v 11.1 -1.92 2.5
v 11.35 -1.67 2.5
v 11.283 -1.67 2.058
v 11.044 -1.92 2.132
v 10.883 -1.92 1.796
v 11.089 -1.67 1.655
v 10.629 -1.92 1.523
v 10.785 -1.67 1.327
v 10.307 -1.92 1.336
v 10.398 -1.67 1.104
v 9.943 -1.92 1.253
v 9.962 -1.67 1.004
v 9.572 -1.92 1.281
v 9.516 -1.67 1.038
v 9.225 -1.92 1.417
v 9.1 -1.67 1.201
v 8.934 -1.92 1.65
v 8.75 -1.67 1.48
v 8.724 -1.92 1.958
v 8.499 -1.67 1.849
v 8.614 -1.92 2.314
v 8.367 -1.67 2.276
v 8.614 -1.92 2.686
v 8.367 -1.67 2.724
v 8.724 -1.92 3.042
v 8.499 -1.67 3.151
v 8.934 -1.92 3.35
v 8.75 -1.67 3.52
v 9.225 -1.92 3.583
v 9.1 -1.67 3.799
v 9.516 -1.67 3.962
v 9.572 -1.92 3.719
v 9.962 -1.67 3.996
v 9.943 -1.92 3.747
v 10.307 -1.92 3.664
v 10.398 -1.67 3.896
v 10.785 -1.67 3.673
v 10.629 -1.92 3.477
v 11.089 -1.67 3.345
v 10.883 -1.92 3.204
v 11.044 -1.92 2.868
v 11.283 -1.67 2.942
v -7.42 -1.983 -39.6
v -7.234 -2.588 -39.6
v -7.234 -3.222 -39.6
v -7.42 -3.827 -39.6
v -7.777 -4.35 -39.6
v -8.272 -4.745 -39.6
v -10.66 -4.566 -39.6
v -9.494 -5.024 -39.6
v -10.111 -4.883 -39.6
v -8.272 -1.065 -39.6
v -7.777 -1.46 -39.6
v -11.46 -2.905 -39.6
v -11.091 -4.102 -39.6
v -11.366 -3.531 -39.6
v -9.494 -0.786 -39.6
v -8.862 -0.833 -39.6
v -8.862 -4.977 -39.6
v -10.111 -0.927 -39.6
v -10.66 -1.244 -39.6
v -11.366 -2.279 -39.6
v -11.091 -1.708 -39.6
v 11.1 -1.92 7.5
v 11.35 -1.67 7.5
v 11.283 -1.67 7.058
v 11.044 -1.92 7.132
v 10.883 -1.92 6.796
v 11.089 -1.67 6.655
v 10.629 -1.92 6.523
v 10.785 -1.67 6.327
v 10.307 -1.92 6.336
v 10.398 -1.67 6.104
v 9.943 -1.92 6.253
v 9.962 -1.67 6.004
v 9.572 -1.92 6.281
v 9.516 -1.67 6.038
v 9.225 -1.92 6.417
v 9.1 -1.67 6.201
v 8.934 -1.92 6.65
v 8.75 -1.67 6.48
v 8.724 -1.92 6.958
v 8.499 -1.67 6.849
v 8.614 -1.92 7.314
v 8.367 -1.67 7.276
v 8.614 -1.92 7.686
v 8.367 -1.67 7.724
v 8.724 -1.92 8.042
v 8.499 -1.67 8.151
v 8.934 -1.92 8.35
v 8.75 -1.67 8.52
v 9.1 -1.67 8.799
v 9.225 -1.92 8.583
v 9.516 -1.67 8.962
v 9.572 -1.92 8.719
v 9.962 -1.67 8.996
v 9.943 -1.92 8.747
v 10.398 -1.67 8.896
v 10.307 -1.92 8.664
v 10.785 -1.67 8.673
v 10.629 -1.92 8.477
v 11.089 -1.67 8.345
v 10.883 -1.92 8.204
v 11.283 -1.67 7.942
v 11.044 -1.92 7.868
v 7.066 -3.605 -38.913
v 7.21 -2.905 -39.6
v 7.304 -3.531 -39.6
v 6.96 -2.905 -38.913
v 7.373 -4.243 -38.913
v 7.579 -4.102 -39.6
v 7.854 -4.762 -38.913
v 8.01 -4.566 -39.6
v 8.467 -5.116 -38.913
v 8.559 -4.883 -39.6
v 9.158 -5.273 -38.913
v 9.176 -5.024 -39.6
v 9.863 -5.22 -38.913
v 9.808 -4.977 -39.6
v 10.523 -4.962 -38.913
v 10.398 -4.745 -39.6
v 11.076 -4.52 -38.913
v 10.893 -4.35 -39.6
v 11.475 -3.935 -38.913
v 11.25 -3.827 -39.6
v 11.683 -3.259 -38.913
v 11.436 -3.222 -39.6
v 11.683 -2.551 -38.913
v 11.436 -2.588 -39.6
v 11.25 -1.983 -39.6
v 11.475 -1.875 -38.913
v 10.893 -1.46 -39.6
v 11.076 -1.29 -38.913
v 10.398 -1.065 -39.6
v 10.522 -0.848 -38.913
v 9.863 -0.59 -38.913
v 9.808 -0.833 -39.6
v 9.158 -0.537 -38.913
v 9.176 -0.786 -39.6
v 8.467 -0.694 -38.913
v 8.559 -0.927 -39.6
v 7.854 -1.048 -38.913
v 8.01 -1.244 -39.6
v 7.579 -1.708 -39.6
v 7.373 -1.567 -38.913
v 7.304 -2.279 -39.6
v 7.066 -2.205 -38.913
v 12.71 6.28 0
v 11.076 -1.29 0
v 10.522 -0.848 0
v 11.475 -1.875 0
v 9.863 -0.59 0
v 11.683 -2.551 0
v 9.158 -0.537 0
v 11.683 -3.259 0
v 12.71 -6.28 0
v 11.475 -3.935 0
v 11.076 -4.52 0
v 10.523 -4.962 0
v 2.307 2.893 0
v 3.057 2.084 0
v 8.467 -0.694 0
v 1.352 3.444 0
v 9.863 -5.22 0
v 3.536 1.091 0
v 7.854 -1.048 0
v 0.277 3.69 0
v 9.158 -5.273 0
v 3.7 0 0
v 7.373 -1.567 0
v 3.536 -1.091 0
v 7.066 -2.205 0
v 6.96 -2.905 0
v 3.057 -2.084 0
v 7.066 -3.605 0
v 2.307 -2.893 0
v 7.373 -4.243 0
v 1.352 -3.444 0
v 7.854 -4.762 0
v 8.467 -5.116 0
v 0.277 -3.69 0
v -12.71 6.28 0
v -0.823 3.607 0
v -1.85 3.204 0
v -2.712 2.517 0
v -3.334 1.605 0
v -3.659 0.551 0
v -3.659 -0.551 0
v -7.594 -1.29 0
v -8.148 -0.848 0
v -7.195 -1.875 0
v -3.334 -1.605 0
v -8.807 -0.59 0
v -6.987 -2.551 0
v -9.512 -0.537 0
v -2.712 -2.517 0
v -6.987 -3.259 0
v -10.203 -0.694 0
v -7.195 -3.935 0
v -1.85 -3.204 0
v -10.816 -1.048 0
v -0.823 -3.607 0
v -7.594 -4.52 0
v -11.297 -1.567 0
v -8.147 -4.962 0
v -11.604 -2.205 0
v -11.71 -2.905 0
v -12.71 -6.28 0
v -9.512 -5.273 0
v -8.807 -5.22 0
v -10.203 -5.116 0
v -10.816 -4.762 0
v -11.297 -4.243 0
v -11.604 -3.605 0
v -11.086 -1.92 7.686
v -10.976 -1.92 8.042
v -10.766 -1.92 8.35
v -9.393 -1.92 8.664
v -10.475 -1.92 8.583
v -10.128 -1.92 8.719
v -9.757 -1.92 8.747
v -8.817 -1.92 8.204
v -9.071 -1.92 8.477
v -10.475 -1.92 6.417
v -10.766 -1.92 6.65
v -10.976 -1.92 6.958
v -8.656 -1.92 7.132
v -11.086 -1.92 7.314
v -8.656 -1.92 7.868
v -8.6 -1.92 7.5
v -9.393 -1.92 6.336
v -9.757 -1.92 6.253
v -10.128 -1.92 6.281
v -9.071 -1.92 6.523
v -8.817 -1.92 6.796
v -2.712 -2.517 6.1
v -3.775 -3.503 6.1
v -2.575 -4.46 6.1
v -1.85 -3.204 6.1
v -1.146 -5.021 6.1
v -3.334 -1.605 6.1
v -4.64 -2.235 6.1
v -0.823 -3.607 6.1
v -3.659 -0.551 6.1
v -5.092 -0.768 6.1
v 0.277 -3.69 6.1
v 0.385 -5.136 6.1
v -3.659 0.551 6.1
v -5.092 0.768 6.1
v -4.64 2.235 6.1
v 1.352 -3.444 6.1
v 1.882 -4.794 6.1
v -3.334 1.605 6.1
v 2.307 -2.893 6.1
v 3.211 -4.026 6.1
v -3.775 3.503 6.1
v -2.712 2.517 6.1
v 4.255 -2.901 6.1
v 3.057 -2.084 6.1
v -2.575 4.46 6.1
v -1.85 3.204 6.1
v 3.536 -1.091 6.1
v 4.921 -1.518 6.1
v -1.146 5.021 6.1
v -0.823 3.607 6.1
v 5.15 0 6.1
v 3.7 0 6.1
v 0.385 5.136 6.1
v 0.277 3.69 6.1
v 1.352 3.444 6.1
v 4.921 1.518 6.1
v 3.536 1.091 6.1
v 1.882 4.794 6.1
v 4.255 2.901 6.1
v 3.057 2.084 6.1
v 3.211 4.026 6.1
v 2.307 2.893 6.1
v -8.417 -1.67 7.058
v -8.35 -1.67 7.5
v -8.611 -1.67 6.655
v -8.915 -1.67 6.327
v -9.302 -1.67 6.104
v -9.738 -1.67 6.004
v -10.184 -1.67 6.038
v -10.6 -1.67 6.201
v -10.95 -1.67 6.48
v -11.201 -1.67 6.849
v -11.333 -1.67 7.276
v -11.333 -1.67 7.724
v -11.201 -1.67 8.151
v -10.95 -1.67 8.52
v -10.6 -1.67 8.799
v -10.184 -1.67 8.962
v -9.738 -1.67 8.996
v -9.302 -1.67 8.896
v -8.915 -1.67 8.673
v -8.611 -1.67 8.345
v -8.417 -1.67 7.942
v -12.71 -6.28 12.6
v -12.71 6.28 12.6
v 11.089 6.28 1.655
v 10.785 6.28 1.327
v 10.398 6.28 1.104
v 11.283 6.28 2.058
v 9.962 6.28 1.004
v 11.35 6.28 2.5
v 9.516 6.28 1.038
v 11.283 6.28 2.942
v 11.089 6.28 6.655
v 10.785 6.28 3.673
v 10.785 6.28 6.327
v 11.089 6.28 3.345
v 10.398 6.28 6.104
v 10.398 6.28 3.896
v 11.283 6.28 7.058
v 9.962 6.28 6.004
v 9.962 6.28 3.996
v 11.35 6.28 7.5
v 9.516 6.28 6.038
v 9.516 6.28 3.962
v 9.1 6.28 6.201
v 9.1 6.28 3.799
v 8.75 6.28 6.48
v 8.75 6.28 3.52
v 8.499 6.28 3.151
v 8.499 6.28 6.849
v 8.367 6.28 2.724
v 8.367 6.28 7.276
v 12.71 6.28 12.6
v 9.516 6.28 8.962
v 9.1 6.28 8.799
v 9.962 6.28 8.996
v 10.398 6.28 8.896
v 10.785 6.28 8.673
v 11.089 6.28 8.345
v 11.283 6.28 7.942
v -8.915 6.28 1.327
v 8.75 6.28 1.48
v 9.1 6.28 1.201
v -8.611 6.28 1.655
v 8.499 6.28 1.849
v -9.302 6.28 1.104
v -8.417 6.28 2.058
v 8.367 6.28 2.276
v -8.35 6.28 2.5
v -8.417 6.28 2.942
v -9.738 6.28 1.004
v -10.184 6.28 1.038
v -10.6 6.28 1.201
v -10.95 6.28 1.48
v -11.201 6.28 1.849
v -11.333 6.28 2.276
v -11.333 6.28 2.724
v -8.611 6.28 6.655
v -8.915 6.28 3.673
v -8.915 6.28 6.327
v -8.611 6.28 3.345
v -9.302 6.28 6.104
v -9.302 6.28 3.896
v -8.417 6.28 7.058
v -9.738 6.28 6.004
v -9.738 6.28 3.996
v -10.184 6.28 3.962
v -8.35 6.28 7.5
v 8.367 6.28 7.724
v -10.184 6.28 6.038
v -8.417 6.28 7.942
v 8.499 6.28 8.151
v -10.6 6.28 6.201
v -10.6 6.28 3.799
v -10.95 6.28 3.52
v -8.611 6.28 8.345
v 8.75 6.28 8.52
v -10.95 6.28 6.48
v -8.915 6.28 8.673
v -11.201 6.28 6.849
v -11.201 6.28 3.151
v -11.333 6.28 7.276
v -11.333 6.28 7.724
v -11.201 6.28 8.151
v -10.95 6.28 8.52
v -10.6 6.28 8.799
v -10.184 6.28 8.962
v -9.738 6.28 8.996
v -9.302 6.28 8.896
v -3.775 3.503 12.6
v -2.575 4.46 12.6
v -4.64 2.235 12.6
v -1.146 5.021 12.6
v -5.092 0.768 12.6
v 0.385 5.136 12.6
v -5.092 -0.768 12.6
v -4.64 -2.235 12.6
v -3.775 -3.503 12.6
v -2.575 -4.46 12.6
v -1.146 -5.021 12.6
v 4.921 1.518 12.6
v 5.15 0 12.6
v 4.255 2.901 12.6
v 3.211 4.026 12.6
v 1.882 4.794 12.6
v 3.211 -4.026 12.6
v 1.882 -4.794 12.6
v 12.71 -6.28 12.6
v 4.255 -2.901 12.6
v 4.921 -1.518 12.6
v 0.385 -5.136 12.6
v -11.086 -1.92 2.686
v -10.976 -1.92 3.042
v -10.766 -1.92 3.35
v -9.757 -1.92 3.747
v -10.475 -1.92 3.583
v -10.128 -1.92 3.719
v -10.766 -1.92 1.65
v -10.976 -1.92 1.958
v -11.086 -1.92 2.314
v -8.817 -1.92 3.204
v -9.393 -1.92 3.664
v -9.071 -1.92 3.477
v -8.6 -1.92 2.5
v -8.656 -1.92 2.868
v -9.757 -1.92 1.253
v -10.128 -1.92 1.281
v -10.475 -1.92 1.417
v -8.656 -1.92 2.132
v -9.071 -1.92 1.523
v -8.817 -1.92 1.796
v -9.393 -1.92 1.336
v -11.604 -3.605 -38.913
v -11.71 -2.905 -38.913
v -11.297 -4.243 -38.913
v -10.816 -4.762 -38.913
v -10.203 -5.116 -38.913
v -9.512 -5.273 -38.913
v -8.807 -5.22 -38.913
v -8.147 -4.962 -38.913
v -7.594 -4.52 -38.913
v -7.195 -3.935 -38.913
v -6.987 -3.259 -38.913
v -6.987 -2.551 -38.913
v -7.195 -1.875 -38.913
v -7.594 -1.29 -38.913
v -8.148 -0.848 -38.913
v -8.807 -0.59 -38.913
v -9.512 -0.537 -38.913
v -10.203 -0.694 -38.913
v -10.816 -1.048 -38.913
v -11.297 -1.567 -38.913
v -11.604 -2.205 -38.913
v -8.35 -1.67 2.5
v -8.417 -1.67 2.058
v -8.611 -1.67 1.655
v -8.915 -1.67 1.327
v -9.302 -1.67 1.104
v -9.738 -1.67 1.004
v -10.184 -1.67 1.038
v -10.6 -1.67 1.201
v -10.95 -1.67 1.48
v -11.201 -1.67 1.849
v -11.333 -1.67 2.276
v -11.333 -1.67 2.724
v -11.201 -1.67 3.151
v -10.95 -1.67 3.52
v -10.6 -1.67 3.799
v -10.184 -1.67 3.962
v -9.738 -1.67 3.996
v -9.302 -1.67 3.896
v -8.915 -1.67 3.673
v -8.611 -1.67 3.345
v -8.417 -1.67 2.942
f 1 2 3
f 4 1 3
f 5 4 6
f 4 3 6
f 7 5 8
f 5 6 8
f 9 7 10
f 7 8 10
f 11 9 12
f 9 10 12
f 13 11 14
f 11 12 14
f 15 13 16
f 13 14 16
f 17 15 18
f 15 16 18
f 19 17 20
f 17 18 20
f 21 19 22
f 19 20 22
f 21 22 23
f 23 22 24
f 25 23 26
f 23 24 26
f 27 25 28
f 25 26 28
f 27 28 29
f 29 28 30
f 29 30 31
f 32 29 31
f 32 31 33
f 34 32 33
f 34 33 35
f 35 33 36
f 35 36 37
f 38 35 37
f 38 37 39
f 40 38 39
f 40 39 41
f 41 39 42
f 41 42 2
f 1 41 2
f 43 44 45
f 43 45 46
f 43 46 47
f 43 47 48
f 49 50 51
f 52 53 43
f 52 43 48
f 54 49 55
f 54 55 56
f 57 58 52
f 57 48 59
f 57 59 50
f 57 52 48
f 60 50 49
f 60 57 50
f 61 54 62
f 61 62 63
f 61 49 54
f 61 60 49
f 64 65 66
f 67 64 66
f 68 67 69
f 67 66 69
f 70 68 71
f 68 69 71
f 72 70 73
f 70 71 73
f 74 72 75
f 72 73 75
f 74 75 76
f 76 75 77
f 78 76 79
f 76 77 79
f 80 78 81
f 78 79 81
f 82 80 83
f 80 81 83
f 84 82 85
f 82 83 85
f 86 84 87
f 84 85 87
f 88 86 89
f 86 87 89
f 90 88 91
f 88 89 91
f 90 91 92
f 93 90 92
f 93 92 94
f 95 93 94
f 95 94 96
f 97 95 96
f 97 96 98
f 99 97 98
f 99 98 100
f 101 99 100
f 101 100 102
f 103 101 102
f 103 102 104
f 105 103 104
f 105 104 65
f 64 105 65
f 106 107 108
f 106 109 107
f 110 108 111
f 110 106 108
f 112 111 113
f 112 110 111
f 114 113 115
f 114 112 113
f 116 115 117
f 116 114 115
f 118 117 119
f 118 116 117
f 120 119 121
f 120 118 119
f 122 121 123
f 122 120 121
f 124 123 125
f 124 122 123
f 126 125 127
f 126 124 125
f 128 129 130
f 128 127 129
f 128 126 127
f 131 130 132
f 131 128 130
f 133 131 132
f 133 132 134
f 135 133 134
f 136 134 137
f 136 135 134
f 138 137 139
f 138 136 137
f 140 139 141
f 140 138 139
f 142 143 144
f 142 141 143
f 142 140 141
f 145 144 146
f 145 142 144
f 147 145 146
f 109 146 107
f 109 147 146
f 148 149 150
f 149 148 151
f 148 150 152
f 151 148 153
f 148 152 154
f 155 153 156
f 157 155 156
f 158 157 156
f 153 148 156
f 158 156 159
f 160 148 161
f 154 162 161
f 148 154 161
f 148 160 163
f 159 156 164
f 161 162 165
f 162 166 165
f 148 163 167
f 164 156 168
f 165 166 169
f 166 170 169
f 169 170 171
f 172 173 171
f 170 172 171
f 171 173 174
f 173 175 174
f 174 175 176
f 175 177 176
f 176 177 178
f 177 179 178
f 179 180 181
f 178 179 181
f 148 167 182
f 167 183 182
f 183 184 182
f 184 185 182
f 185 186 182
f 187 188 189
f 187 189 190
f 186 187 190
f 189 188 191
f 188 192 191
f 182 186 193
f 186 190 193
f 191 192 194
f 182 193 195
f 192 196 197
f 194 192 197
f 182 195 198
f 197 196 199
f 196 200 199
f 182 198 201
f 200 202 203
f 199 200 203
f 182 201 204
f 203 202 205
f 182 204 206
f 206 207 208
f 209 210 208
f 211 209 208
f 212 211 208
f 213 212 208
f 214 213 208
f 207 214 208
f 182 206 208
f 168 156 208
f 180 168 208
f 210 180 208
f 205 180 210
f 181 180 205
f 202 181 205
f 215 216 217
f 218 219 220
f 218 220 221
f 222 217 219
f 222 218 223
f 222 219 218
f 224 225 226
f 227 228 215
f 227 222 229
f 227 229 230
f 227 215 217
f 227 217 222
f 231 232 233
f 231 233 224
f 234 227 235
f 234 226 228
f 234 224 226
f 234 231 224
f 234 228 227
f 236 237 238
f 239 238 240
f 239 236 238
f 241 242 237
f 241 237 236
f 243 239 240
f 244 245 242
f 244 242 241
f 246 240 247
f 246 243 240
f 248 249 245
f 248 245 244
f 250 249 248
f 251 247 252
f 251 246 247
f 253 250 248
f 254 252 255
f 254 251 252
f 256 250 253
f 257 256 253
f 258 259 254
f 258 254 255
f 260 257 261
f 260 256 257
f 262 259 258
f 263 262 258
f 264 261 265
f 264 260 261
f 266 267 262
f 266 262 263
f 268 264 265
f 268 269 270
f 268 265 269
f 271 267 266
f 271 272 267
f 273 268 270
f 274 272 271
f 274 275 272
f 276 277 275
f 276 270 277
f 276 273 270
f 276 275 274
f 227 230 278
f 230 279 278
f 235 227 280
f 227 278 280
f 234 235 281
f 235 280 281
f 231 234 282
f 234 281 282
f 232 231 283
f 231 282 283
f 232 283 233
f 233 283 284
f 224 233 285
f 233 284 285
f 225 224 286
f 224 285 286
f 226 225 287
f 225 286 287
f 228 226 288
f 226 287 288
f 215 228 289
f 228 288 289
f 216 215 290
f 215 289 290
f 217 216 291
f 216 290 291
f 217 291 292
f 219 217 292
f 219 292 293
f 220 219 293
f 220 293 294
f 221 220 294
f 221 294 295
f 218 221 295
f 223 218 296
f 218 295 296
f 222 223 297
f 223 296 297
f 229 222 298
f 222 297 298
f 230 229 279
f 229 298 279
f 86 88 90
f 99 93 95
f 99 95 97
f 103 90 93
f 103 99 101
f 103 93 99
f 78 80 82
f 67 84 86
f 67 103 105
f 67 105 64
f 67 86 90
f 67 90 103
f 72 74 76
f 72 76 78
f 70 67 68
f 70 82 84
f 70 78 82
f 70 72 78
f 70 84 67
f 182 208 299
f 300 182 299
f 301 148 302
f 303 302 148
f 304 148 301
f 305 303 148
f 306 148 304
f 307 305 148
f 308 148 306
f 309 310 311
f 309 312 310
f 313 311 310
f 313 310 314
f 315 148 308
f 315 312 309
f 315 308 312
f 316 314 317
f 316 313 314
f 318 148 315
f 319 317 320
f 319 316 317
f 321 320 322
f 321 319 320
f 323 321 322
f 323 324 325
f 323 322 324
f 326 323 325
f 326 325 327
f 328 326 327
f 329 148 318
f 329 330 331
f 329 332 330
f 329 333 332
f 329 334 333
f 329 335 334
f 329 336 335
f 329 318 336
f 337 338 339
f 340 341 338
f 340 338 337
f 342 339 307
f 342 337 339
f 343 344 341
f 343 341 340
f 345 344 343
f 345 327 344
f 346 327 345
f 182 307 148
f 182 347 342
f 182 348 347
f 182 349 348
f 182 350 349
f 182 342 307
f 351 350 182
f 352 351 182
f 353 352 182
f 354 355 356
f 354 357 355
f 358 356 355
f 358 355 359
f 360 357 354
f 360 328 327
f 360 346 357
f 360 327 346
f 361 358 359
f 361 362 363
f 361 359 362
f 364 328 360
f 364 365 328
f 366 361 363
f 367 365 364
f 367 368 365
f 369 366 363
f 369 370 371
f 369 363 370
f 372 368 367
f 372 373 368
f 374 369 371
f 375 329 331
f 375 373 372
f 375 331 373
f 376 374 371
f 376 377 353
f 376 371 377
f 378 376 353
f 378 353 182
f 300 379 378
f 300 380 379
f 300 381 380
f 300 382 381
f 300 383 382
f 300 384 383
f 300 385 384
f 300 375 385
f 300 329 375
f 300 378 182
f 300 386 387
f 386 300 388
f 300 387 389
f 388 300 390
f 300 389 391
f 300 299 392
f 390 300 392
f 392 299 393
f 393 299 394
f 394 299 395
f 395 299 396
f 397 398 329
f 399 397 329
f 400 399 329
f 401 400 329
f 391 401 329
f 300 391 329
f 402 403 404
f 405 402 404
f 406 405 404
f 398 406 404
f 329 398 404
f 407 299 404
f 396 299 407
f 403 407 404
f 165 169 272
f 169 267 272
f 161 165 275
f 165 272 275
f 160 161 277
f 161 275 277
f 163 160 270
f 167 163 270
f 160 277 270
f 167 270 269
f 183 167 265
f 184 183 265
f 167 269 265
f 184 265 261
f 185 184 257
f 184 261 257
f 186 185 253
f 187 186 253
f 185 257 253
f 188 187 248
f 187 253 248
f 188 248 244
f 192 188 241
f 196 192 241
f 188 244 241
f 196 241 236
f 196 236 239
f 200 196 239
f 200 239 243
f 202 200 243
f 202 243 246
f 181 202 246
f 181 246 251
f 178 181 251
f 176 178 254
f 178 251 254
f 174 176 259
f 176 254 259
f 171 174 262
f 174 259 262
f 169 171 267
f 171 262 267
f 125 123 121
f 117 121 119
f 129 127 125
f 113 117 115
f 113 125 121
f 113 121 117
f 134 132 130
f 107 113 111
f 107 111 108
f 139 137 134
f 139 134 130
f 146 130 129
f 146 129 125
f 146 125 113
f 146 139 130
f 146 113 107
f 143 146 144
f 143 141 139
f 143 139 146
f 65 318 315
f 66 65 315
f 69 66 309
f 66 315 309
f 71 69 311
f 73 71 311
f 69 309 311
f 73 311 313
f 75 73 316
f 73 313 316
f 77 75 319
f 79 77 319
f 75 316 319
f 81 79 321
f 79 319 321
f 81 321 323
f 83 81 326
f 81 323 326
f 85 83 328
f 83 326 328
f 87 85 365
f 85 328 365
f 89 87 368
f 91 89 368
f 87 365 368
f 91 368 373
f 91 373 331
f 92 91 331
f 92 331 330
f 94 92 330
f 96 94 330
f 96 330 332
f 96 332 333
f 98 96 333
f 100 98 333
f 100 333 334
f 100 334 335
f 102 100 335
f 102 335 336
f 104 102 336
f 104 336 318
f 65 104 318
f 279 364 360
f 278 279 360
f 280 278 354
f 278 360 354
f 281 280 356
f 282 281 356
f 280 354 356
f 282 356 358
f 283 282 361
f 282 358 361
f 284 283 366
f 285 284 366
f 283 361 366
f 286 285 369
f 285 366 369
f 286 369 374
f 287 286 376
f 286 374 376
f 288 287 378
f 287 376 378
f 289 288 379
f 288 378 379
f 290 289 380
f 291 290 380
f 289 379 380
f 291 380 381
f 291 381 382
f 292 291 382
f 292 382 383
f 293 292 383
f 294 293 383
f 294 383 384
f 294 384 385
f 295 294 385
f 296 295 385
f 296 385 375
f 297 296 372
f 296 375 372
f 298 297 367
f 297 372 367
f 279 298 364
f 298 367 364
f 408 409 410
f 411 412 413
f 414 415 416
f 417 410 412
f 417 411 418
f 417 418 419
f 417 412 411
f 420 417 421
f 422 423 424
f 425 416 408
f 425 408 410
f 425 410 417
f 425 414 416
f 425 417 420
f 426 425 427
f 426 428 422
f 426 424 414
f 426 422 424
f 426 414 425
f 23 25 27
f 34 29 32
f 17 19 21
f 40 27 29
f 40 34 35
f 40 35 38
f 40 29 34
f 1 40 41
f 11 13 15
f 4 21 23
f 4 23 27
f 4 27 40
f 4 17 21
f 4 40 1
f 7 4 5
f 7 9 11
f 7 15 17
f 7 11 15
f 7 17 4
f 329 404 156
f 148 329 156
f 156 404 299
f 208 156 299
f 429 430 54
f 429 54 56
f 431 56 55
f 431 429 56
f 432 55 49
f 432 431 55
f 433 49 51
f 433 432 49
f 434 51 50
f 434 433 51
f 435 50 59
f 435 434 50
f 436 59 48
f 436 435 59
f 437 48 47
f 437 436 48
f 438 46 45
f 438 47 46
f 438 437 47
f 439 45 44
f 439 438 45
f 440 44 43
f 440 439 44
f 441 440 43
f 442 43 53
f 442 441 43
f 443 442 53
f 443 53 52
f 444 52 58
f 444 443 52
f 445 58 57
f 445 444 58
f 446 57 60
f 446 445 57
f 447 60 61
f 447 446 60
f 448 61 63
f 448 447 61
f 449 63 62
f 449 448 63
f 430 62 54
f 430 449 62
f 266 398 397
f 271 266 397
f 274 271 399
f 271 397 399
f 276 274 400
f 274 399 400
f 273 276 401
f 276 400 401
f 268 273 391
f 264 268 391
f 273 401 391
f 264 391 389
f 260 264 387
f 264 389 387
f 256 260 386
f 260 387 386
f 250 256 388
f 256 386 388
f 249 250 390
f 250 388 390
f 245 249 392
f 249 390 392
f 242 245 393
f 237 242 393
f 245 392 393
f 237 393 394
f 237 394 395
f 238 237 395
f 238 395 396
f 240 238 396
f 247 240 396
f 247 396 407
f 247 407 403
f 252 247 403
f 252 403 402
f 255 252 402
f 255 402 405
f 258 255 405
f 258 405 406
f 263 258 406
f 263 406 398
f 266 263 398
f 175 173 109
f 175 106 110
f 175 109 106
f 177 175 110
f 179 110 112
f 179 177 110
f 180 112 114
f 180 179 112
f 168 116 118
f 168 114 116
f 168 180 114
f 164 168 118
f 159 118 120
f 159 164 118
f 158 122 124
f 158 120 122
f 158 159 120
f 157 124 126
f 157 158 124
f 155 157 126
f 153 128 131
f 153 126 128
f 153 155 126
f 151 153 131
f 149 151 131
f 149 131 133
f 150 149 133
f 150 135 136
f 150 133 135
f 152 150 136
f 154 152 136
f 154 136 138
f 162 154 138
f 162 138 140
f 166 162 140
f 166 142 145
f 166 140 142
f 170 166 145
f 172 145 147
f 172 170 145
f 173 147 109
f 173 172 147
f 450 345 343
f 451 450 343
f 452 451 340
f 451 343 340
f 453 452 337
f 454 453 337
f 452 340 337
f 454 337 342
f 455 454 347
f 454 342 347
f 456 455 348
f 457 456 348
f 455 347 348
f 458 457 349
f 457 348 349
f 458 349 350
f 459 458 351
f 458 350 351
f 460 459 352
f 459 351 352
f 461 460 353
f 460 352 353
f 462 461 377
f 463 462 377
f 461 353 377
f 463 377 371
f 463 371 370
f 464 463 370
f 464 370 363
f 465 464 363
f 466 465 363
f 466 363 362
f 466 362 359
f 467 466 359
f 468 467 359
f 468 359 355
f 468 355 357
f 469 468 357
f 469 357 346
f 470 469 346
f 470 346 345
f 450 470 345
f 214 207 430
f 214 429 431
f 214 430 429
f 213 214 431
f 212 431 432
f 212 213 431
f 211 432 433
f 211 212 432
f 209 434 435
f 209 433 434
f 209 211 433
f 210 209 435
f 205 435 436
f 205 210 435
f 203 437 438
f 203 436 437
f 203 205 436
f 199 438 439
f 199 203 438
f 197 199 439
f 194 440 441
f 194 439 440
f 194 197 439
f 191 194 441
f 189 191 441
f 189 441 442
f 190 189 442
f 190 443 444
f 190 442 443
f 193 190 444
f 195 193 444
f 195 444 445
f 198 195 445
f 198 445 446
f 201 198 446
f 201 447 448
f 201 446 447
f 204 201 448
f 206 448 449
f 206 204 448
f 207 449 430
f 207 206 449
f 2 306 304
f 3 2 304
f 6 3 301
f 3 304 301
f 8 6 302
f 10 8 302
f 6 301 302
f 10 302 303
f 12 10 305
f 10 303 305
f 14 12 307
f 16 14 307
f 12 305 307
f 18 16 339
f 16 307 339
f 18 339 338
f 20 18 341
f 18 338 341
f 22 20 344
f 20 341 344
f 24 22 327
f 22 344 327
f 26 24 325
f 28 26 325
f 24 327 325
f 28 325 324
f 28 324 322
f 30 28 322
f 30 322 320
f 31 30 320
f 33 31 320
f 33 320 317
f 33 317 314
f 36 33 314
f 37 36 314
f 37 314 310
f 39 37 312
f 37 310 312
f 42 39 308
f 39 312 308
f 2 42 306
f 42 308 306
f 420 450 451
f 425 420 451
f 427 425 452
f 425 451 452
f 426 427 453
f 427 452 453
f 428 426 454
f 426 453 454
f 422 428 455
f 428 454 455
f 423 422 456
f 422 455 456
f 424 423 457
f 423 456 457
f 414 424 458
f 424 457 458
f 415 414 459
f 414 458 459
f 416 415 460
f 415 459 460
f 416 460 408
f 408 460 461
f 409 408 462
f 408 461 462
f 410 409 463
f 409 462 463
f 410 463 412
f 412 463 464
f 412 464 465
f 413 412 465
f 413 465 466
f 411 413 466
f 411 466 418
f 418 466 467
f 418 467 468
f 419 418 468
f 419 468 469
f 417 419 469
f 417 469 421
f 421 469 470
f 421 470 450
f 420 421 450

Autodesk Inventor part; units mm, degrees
ref_plane "YZ Plane" through (0, 0, 0) normal (1, 0, 0) x (0, 1, 0)
ref_plane "XZ Plane" through (0, 0, 0) normal (0, 1, 0) x (-1, 0, 0)
ref_plane "XY Plane" through (0, 0, 0) normal (0, 0, 1) x (1, 0, 0)
sketch "Sketch1" plane through (0, 0, 0) normal (0, 1, 0) x (-1, 0, 0)
  line L0 (12.71, 0) -> (12.71, 12.6)
  line L1 (12.71, 12.6) -> (-12.71, 12.6)
  line L2 (-12.71, 12.6) -> (-12.71, 0)
  line L3 (-12.71, 0) -> (12.71, 0)
  point P0 (0, 0)
  dimension "d0" = 12.71
  dimension "d1" = 12.6
  dimension "d2" = 25.42
extrude "Extrusion1" add sketch "Sketch1" along normal mid plane 12.56
sketch "Sketch2" plane through (-12.71, 6.28, 12.6) normal (0, 0, 1) x (1, 0, 0)
  circle A0 centre (12.71, -6.28) radius 3.7
  dimension "d5" = 7.4
extrude "Extrusion2" cut sketch "Sketch2" against normal blind 17.3225
sketch "Sketch3" plane through (-12.71, 6.28, 12.6) normal (0, 0, 1) x (1, 0, 0)
  circle A0 centre (12.71, -6.28) radius 5.15
  dimension "d8" = 10.3
extrude "Extrusion3" cut sketch "Sketch3" against normal blind 6.5
sketch "Sketch4" plane through (0, 6.28, 0) normal (0, 1, 0) x (1, 0, 0)
  line L0 (0, 0) -> (-9.85, 0) construction
  line L1 (-9.85, 0) -> (-9.85, -2.5) construction
  circle A0 centre (-9.85, -2.5) radius 1.5
  line L2 (-9.85, -2.5) -> (-9.85, -7.5) construction
  circle A1 centre (-9.85, -7.5) radius 1.5
  circle A2 centre (9.85, -2.5) radius 1.5
  circle A3 centre (9.85, -7.5) radius 1.5
  dimension "d11" = 9.85
  dimension "d12" = 2.5
  dimension "d13" = 3
  dimension "d14" = 5
  dimension "d15" = 3
extrude "Extrusion4" cut sketch "Sketch4" against normal blind 8.2
chamfer "Chamfer1" distance 0.25 angle 45 4 edges at (-11.35, -1.92, 7.5) (-11.35, -1.92, 2.5) (8.35, -1.92, 2.5) (8.35, -1.92, 7.5)
sketch "Sketch5" plane through (12.71, 6.28, 0) normal (0, 0, -1) x (-1, 0, 0)
  line L0 (1, -12.56) -> (1, -9.185) construction
  line L1 (1, -9.185) -> (3.375, -9.185) construction
  circle A0 centre (3.375, -9.185) radius 2.375
  circle A1 centre (12.71, -6.28) radius 3.7 projected
  line L2 (12.71, -12.56) -> (12.71, -6.28) construction
  circle A2 centre (22.045, -9.185) radius 2.375
  point P0 (0, -12.56)
  dimension "d21" = 1
  dimension "d22" = 3.375
  dimension "d23" = 2.375
extrude "Extrusion5" add sketch "Sketch5" along normal blind 39.6 contours A0 | A2
chamfer "Chamfer2" distance 0.25 angle 70 1 edges at (11.71, -2.905, -39.6) measured on face at (9.5733, -3.5643, -39.6)
chamfer "Chamfer3" distance 0.25 angle 70 1 edges at (-6.96, -2.905, -39.6) measured on face at (-9.9756, -2.2535, -39.6)
properties part number "PocketNC_Vise_part1" material "Aluminum 6061"
